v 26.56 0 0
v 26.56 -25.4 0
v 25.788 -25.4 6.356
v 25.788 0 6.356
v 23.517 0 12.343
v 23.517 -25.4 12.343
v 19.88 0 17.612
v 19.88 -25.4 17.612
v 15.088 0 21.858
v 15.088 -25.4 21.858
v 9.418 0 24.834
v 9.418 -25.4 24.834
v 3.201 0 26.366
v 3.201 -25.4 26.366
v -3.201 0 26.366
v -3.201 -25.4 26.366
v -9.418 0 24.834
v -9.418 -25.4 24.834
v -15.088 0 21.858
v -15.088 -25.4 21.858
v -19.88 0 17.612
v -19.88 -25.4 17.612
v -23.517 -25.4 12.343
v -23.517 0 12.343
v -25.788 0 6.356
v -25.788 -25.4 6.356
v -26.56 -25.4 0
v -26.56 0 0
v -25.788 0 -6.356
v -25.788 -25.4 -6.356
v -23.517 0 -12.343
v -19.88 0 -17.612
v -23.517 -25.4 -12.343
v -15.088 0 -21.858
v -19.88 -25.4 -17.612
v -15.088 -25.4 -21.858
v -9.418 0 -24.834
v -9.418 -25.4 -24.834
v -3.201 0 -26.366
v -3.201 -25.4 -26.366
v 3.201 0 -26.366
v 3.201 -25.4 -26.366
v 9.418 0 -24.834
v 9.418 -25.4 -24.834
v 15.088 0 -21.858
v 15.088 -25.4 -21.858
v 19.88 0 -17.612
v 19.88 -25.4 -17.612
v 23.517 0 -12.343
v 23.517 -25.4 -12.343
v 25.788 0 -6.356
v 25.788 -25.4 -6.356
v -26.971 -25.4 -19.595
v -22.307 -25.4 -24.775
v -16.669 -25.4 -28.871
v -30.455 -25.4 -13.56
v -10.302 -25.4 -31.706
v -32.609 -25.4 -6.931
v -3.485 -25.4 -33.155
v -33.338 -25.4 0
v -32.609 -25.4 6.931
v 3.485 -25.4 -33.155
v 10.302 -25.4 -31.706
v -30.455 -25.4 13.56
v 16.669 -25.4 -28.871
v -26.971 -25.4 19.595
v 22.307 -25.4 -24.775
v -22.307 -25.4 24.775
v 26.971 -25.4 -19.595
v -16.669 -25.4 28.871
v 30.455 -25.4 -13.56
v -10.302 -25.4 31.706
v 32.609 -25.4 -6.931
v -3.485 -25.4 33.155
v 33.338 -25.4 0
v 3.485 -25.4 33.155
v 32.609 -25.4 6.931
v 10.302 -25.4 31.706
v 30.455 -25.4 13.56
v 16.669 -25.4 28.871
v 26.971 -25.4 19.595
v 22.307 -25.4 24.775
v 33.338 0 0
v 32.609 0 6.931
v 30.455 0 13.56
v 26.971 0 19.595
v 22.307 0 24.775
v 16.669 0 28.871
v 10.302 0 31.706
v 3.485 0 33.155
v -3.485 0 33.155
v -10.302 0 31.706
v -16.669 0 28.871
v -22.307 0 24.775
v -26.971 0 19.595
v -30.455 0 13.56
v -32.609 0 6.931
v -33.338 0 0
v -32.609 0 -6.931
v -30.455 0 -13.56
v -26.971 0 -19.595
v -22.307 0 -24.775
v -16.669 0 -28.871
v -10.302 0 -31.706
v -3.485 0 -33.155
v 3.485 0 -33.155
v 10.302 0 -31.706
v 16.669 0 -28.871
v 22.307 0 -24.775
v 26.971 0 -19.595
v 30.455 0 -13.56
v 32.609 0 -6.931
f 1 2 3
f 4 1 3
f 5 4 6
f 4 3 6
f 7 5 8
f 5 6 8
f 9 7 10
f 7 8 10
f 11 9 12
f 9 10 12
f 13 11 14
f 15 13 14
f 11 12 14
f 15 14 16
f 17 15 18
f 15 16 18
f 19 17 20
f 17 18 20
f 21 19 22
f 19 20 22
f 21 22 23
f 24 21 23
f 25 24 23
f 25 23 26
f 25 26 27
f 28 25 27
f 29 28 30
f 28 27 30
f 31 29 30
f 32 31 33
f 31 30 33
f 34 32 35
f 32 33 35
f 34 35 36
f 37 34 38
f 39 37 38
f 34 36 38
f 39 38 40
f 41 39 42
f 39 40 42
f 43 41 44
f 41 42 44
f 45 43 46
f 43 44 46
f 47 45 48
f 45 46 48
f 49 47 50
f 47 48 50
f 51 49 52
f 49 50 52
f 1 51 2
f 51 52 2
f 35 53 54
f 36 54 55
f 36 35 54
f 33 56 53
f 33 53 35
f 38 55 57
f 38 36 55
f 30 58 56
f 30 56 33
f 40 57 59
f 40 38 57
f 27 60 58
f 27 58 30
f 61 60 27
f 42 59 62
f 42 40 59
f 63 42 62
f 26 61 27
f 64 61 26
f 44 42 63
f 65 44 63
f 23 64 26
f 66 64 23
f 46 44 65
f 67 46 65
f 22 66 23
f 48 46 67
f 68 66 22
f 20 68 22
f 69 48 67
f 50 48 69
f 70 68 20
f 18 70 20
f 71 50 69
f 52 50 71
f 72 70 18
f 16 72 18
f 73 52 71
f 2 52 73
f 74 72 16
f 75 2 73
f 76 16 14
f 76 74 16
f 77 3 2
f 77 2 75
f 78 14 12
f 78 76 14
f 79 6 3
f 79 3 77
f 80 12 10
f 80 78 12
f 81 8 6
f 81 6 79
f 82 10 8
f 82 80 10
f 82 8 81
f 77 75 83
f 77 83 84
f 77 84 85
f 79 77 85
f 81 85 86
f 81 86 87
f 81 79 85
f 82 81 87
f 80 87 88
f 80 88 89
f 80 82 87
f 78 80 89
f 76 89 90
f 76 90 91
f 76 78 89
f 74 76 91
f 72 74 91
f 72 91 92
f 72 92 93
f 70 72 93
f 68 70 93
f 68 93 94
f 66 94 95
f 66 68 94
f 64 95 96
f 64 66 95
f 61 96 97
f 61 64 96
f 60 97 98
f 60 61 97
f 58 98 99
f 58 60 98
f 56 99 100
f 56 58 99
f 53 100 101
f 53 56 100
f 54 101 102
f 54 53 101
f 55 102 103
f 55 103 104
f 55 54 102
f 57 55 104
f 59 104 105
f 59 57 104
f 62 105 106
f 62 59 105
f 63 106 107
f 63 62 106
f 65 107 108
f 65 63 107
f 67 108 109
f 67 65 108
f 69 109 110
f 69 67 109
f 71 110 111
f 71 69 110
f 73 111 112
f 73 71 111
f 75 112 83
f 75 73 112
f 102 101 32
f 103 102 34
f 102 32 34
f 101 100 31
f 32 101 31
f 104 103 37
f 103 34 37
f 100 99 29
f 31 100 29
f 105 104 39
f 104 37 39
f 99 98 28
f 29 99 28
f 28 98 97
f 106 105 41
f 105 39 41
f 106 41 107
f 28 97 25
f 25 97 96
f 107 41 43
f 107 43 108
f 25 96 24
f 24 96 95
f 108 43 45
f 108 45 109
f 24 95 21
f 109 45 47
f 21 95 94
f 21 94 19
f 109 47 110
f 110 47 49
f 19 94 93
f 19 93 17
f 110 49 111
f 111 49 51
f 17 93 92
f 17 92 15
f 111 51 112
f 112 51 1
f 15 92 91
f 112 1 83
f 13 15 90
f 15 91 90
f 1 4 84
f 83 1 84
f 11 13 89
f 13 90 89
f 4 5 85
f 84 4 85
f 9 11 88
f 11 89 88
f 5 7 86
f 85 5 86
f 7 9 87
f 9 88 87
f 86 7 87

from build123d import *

# Parameters (mm, degrees)
F0_W     = 175.97738
F0_H     = 127.75816
F1_DEPTH = 25.4
F2_R     = 33.3375
F3_DEPTH = 25.4
F4_R     = 26.559613
F5_DEPTH = 25.4


with BuildPart() as f1:
    # F0 (on Front) → F1 (new body)
    with BuildSketch(Plane.XZ):
        Rectangle(F0_W, F0_H)
    extrude(amount=F1_DEPTH)

    # F2 (on face) → F3 (intersect)
    with BuildSketch(Plane.XZ.offset(25.4)):
        Circle(F2_R)
    extrude(amount=-F3_DEPTH, mode=Mode.INTERSECT)

    # F4 (on face) → F5 (cut)
    with BuildSketch(Plane.XZ.offset(25.4)):
        Circle(F4_R)
    extrude(amount=-F5_DEPTH, mode=Mode.SUBTRACT)


solid = f1.part
